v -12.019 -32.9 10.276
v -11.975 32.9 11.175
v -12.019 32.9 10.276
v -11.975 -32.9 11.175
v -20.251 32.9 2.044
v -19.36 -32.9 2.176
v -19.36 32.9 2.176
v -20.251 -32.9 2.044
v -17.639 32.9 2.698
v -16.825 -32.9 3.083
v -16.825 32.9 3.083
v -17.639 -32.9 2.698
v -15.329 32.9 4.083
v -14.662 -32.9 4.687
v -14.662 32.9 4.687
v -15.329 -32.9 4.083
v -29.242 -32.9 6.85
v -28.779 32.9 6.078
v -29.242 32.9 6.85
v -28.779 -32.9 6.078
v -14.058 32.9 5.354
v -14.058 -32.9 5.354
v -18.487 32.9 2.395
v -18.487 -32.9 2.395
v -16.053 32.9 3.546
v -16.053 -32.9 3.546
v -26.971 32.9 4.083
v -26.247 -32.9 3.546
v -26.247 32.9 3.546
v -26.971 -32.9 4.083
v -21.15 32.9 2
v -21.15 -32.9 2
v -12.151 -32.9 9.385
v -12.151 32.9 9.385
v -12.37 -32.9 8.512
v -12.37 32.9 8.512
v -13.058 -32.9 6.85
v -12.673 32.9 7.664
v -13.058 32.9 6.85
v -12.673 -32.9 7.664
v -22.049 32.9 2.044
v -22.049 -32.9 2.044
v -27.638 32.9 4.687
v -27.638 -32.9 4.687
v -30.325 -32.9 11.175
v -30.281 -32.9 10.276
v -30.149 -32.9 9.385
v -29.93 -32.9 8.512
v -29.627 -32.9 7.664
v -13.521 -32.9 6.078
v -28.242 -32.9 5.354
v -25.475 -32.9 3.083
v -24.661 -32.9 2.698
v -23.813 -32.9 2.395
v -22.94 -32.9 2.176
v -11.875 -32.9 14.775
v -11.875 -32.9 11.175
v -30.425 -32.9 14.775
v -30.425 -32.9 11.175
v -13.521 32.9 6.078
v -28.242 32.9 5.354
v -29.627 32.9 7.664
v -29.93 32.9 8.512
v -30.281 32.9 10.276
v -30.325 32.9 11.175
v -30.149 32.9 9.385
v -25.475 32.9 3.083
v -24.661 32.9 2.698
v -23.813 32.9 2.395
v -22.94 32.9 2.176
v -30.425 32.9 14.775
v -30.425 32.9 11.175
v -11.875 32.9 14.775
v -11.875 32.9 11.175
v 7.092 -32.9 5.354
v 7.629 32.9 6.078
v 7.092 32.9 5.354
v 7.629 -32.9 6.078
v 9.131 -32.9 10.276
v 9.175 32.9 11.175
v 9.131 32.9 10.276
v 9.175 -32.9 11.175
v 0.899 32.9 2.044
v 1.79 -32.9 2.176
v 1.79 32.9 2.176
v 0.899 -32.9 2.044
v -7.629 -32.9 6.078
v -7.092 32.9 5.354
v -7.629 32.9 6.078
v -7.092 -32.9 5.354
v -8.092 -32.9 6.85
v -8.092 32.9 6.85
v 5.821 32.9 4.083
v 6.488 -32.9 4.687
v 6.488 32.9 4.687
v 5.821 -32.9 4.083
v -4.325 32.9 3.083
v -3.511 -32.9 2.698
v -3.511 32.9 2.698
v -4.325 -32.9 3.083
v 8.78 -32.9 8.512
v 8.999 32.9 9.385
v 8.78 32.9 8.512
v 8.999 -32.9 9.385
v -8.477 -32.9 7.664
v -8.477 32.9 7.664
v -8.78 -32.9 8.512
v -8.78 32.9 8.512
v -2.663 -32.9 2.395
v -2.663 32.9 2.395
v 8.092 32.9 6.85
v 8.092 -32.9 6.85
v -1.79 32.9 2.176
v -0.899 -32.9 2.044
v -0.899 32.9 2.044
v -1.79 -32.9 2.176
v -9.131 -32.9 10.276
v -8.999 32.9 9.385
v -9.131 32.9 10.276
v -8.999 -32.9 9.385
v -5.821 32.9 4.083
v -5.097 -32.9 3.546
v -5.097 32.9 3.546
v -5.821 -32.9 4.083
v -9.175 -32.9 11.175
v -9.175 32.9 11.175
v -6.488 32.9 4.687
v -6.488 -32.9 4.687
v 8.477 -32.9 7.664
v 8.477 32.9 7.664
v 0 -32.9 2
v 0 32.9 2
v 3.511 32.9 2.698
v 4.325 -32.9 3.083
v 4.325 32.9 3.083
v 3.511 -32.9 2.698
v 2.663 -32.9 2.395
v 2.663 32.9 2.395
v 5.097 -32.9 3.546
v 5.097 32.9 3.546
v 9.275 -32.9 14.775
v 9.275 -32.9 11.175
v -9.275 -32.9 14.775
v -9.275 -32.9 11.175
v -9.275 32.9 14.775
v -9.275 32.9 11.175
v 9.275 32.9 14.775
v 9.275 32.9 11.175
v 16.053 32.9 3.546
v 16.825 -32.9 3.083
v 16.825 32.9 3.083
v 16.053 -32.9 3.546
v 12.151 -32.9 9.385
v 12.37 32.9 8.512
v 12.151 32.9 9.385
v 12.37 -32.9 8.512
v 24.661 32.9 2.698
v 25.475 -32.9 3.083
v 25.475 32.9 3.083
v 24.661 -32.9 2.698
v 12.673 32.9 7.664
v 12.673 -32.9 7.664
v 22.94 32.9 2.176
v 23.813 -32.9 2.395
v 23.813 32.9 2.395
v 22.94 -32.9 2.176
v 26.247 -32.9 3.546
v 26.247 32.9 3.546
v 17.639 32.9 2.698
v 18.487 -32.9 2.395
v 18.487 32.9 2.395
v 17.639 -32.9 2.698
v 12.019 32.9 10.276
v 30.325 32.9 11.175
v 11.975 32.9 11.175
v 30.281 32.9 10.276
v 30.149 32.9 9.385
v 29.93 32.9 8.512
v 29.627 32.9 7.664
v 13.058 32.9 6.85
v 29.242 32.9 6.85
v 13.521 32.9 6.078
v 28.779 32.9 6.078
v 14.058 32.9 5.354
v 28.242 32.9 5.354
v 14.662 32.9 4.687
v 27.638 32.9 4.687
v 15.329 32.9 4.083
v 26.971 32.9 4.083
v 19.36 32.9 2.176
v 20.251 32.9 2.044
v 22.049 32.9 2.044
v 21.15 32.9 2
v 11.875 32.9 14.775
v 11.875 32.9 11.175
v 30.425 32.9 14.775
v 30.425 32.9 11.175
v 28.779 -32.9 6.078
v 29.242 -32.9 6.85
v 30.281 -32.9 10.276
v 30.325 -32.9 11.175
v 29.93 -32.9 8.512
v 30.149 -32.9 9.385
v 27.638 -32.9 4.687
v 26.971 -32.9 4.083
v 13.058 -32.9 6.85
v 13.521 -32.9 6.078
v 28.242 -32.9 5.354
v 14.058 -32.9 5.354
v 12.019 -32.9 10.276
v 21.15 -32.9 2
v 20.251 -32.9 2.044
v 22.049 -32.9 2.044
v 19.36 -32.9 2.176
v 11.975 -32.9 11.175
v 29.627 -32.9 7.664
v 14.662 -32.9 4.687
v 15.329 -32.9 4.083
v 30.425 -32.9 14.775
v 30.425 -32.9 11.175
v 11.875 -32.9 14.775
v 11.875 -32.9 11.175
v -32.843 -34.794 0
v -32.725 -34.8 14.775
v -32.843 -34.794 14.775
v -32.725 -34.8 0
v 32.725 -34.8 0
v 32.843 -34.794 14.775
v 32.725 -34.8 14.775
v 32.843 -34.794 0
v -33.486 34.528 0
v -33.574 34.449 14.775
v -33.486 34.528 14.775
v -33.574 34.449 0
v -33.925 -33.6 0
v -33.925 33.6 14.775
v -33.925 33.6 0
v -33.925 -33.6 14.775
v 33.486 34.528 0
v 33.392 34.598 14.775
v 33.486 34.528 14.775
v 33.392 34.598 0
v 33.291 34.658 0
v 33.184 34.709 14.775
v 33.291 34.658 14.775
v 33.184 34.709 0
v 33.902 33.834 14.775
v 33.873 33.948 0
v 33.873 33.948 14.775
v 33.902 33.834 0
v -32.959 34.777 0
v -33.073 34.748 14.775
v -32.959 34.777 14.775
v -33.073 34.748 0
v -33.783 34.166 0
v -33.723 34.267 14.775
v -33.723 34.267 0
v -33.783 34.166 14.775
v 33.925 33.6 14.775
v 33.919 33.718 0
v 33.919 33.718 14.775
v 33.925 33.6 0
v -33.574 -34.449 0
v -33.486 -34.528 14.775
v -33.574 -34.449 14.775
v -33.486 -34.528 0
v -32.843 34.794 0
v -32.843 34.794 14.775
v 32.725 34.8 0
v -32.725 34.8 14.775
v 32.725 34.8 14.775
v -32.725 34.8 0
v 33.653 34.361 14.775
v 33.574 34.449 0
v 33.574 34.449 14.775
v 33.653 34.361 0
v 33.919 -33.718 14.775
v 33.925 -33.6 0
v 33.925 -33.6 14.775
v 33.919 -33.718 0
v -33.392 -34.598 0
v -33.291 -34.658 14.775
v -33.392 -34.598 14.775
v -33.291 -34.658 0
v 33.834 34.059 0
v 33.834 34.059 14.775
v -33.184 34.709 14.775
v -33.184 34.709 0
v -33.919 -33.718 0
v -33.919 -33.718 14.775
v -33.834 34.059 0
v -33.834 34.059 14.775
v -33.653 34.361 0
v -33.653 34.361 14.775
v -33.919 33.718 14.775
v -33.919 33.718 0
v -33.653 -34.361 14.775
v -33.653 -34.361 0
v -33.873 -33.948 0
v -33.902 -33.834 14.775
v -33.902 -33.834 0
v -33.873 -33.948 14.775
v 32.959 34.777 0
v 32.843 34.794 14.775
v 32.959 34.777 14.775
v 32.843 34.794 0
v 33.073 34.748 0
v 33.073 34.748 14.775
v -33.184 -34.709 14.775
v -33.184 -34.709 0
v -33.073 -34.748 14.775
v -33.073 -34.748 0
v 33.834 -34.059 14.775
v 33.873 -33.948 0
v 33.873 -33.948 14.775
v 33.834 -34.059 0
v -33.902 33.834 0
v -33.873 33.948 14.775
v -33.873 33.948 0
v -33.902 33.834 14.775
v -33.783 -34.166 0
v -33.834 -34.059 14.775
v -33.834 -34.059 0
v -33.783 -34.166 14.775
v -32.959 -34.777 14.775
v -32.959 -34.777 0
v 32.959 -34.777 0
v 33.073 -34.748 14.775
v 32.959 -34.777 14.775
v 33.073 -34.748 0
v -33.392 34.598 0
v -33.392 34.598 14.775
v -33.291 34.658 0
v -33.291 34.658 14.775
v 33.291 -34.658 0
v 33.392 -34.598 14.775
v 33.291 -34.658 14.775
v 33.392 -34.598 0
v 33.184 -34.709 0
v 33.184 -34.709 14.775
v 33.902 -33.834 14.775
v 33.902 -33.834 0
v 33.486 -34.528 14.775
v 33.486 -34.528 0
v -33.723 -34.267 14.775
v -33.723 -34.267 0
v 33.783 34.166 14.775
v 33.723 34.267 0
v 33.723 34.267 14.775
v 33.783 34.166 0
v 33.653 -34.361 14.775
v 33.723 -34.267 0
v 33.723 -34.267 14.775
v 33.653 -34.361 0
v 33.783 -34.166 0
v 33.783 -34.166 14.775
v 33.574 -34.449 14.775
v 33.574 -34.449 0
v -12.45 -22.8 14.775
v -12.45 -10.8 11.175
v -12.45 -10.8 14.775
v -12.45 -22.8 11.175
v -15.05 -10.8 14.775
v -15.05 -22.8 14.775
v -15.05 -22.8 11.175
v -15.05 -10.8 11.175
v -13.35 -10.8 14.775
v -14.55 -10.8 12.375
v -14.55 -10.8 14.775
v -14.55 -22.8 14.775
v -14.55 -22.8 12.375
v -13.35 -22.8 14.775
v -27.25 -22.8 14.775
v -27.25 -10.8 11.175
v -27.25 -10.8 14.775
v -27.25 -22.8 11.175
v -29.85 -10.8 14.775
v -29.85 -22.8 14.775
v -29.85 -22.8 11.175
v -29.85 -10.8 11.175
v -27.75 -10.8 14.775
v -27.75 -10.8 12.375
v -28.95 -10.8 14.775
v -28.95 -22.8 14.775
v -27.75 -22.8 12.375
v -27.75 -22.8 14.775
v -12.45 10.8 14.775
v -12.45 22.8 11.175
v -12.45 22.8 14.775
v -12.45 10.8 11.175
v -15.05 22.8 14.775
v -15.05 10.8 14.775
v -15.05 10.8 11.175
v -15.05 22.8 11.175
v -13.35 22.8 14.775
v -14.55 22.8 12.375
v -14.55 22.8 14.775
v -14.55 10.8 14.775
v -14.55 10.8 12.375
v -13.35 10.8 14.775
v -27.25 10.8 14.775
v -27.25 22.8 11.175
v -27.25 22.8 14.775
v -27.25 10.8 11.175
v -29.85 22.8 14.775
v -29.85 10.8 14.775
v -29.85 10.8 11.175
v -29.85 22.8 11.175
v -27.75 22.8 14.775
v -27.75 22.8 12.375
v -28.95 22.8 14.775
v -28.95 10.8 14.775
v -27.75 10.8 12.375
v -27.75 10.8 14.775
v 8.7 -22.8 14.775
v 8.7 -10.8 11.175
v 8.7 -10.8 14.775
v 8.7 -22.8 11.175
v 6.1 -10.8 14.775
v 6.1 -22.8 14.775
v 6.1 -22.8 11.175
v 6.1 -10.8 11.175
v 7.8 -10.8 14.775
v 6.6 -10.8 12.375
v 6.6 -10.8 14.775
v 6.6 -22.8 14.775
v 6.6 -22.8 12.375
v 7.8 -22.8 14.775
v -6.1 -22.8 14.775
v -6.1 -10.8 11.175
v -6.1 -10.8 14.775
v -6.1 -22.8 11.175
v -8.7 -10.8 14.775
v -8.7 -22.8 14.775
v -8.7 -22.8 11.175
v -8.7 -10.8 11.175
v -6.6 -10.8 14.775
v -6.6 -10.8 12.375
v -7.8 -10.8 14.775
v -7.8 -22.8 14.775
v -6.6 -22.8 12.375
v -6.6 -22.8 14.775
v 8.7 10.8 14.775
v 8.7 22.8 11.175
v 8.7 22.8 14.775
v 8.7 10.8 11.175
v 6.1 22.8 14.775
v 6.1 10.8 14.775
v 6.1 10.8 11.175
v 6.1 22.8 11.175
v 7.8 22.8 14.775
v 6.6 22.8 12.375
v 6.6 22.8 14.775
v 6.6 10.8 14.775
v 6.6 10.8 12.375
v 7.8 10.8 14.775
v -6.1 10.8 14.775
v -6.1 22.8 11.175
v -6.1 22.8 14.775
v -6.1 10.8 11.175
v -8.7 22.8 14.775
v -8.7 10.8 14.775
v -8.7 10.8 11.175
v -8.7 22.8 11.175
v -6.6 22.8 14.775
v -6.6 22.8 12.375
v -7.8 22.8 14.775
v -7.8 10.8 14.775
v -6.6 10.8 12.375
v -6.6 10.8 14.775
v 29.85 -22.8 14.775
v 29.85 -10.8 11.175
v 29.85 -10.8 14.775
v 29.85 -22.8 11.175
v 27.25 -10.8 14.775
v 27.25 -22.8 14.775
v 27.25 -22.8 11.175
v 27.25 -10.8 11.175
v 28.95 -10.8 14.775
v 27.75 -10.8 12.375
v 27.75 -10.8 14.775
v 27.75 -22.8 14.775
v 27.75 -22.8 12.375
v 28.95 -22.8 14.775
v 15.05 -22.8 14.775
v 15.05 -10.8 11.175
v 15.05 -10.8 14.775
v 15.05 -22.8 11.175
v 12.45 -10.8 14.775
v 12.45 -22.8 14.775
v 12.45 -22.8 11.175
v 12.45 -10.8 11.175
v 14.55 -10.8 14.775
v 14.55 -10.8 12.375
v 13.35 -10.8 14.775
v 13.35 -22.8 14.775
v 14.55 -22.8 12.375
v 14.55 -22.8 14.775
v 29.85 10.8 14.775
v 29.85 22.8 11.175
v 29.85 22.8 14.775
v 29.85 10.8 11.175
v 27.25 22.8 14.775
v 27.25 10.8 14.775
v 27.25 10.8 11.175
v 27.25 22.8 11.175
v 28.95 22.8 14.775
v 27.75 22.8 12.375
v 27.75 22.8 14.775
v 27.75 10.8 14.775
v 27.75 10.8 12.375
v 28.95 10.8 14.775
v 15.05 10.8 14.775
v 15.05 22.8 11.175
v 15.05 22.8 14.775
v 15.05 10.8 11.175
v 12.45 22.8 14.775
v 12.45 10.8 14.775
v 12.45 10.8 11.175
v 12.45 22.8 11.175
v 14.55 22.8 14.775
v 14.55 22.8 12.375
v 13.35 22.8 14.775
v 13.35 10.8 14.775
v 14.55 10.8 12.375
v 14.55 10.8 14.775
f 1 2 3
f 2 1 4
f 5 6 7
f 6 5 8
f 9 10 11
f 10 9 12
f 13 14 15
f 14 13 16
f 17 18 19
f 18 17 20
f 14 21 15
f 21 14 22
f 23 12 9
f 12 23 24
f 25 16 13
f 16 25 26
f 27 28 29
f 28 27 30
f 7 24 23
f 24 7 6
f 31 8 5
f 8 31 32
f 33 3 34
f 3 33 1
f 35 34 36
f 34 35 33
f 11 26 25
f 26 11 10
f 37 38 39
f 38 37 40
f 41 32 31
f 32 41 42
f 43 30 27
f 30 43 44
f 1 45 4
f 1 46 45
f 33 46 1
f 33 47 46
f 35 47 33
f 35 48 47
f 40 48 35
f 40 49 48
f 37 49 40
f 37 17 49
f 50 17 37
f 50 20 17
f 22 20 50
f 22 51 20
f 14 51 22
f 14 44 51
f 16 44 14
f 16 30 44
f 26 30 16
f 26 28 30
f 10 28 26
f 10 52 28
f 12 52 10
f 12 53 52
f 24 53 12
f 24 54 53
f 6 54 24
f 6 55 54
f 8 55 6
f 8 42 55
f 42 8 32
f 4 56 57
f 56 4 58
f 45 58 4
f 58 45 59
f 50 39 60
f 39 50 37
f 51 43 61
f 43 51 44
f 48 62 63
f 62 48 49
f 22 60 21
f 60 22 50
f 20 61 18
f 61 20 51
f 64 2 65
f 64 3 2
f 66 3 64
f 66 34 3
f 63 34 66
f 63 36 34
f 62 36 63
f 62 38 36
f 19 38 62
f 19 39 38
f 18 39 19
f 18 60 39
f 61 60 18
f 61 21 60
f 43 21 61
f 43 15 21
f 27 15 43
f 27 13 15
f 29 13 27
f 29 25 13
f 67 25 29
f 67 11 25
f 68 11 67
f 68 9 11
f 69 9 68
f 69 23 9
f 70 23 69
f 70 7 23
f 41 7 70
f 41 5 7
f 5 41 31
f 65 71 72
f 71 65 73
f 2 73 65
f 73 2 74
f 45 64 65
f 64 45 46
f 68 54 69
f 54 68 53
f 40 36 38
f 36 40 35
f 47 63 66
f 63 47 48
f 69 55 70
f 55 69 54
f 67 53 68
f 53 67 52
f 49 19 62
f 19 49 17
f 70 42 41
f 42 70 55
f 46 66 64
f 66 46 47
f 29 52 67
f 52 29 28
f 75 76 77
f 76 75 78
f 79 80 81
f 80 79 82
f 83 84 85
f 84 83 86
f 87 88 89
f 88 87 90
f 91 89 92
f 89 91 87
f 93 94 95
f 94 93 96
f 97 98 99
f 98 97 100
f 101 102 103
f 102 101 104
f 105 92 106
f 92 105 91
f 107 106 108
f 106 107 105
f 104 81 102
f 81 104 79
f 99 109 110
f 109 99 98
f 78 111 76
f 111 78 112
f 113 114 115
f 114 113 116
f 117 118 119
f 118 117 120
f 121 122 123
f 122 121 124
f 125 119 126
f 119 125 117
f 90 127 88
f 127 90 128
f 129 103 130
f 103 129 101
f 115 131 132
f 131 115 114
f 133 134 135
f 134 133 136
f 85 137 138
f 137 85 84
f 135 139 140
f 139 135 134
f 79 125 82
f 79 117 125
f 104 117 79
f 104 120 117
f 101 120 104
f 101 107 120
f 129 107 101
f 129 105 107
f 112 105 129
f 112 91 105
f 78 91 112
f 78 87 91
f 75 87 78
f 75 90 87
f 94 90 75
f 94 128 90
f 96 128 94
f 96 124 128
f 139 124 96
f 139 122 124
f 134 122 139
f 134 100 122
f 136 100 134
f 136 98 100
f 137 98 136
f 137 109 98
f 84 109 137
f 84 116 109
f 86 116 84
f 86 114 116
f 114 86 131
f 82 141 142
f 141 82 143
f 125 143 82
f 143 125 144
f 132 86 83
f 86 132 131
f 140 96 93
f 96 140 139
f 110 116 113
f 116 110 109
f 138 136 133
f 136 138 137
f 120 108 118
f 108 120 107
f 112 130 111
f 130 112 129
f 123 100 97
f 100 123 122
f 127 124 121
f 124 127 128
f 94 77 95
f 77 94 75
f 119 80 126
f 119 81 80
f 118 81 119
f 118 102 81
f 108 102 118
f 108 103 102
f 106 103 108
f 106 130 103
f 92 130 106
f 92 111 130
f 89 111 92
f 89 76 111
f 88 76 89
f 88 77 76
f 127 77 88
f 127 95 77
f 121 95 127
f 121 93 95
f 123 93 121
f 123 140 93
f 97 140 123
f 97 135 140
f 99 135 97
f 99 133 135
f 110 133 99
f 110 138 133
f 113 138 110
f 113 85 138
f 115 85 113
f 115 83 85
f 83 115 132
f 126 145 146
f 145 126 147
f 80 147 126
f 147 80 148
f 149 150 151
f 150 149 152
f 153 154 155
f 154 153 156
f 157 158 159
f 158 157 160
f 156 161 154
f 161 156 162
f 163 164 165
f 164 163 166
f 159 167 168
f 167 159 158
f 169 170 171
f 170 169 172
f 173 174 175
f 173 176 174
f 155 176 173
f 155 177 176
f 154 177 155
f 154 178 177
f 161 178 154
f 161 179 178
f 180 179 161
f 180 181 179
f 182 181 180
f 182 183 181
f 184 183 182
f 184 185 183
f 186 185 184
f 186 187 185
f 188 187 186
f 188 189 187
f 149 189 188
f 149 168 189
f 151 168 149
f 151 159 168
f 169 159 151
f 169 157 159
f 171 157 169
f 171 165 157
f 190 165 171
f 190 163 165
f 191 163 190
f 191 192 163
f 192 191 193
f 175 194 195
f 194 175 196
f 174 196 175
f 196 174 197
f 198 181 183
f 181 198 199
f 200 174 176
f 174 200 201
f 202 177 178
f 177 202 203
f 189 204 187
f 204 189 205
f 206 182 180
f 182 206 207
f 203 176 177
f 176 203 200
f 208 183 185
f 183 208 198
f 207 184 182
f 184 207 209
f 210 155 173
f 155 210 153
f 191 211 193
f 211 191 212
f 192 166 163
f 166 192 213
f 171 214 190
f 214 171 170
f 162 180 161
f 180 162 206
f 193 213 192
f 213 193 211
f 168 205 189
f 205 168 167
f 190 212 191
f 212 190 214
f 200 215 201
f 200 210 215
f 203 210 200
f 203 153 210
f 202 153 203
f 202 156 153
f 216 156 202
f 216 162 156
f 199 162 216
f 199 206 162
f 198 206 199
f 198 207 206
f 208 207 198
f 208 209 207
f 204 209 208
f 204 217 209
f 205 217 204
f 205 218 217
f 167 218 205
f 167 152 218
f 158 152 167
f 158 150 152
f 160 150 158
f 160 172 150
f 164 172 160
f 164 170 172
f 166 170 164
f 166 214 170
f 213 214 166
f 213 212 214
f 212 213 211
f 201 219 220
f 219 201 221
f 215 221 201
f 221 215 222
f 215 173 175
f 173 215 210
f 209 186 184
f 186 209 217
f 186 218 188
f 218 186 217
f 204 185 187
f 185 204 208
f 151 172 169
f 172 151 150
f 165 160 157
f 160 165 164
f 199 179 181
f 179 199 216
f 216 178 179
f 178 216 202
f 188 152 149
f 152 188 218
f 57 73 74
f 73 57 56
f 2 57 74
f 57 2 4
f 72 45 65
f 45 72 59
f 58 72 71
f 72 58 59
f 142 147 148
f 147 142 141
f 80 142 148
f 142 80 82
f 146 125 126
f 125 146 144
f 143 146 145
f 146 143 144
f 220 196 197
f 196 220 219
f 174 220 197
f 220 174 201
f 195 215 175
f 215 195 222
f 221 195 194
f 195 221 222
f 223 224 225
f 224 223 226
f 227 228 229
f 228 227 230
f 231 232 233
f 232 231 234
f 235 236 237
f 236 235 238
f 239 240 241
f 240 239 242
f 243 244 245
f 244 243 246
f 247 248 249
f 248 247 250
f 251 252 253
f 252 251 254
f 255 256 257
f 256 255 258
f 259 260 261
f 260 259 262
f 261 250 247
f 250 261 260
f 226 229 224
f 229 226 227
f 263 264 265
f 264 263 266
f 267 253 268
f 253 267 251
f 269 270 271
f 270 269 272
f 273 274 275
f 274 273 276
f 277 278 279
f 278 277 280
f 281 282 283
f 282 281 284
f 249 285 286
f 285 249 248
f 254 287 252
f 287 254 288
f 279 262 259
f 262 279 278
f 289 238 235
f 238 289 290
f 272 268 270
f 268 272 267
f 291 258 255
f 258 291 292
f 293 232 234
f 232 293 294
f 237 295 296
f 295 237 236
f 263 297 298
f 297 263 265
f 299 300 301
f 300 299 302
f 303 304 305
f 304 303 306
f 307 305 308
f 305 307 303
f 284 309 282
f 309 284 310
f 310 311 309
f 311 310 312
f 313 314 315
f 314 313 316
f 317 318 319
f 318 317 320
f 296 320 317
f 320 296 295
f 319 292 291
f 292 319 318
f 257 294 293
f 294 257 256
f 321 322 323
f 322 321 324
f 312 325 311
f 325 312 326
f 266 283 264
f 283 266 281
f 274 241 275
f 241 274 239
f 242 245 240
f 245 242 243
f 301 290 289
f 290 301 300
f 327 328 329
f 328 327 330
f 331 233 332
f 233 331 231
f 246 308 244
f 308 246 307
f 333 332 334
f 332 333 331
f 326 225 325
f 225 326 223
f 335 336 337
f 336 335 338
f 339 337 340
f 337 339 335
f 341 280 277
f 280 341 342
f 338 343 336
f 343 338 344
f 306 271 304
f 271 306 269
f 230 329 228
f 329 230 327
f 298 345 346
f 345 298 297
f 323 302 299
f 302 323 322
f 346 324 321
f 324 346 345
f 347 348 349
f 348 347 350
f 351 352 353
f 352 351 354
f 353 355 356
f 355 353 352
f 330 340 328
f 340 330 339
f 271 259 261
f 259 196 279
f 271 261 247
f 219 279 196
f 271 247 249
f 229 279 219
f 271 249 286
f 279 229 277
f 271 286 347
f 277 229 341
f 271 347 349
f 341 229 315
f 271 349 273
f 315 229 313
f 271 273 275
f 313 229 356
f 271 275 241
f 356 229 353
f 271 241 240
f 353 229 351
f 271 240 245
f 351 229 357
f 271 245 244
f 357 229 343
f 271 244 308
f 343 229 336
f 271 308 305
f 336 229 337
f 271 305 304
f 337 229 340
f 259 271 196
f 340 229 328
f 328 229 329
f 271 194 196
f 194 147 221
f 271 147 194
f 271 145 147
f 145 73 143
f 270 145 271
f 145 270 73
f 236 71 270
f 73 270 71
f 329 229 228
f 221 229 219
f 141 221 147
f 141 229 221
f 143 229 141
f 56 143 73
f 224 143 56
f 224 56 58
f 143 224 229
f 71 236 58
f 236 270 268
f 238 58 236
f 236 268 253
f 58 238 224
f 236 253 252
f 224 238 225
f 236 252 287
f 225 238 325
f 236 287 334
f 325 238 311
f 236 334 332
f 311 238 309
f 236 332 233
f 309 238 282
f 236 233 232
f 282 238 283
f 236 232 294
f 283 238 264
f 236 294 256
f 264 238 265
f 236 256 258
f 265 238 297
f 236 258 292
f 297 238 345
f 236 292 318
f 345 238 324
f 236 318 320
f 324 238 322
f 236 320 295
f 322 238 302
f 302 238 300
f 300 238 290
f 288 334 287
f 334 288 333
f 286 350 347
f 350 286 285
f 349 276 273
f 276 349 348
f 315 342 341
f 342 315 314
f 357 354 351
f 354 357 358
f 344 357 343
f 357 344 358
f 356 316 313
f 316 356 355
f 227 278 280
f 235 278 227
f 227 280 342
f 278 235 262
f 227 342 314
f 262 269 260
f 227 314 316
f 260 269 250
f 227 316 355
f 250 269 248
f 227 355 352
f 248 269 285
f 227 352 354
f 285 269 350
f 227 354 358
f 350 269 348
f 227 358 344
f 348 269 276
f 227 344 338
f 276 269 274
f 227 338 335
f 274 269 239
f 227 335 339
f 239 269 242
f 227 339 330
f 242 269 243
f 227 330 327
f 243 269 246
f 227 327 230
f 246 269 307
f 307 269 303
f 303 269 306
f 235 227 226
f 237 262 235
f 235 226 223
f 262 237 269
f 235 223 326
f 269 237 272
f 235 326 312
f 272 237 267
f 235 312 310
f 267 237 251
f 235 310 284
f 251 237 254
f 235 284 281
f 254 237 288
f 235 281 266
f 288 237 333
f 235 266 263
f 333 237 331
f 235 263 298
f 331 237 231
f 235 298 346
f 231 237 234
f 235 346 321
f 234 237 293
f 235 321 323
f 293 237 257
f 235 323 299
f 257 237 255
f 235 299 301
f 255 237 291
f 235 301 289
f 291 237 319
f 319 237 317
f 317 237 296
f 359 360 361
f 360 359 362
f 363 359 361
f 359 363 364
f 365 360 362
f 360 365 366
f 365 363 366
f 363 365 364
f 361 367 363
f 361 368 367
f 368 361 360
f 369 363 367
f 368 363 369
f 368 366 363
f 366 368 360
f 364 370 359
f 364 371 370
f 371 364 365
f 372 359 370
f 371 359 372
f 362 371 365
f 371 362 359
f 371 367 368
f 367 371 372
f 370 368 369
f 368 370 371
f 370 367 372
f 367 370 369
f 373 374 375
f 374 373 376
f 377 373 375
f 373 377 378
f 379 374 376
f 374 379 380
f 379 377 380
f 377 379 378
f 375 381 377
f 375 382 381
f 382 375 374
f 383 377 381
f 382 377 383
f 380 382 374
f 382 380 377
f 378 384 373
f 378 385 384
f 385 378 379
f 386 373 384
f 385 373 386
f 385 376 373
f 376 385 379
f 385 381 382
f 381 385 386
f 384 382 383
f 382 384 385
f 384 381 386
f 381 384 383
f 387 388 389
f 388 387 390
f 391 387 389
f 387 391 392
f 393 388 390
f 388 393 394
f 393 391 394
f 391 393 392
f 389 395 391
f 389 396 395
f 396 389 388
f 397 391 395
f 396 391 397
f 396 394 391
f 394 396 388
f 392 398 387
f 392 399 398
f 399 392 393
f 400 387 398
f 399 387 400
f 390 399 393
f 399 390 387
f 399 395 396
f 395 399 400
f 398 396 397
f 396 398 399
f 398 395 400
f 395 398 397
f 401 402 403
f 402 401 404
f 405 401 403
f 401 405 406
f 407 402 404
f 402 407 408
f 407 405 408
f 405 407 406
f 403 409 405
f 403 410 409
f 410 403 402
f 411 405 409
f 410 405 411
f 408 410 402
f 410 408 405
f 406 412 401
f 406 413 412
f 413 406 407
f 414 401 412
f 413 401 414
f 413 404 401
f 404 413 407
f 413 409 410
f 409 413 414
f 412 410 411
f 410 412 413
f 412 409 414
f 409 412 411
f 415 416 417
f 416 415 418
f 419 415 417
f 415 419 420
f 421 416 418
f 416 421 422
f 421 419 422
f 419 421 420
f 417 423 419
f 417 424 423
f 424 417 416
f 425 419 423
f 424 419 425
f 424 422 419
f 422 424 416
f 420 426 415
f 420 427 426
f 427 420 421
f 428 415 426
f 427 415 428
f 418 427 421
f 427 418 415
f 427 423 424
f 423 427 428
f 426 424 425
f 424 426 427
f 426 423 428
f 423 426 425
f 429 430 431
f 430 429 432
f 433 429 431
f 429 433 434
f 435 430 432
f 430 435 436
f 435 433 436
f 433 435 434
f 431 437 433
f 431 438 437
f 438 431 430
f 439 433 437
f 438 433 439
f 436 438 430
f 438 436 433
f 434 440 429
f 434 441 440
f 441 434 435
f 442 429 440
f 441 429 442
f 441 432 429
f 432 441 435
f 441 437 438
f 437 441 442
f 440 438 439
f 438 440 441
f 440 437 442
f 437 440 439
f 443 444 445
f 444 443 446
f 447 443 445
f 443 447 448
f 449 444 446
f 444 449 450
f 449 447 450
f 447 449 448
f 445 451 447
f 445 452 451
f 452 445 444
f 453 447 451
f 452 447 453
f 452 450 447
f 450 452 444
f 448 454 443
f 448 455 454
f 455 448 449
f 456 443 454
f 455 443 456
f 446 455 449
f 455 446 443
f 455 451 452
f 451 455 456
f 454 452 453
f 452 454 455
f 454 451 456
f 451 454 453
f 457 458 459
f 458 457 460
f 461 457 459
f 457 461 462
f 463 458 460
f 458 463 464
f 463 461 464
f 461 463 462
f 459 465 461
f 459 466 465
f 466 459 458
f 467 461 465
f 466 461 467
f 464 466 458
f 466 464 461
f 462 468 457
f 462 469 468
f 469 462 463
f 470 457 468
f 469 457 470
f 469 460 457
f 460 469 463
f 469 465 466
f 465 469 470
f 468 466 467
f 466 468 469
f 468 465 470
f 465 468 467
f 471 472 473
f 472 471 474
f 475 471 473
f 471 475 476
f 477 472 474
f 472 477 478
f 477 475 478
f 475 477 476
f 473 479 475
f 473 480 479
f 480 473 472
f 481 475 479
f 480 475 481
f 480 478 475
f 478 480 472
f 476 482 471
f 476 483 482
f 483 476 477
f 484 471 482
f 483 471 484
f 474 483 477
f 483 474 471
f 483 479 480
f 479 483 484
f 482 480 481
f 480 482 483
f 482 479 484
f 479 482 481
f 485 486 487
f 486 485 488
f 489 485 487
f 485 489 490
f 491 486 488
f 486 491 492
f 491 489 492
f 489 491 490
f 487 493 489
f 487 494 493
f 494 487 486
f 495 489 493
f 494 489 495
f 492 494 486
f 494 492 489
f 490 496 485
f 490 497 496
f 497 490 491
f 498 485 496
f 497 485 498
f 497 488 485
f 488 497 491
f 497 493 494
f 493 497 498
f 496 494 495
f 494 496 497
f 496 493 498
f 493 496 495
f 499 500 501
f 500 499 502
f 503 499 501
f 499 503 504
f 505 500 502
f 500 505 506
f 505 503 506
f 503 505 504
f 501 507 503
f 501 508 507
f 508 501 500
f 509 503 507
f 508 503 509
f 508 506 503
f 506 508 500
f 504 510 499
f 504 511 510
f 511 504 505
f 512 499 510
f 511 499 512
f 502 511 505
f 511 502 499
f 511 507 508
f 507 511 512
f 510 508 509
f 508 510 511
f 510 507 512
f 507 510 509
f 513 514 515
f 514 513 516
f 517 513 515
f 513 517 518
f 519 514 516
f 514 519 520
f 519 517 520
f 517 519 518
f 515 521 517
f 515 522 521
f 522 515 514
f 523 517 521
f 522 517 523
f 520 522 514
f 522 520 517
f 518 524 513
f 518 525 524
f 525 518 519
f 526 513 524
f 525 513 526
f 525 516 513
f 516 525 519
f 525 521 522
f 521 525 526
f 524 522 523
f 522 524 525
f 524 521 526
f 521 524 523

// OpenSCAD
// file: ../lib/fdm.scad
// Shared FDM-friendly helpers for OpensCAD parts.
// Include from parts with: include <../lib/fdm.scad>;

// Default mesh density when a caller does not pass fragments=.
default_fragments = 48;
// Tiny overshoot used only inside helper boolean cleanup (not a part dimension).
helper_epsilon    = 0.01;

// Rounded rectangle extruded along Z (2D fillet → manifold solid).
module rounded_rect(size, radius, center = true) {
    w = size[0];
    h = size[1];
    r = min(radius, min(w, h) / 2);
    offset(r = r)
        offset(delta = -r)
            square([w, h], center = center);
}

module rounded_box(size, radius, center = true) {
    linear_extrude(height = size[2], center = center)
        rounded_rect([size[0], size[1]], radius, center = true);
}

// Cylinder with optional countersink (flat-head screw seat).
module countersunk_hole(d, h, cs_d = undef, cs_h = undef, center = false, fragments = undef) {
    fn = is_undef(fragments) ? default_fragments : fragments;
    cd = is_undef(cs_d) ? d * 2 : cs_d;
    ch = is_undef(cs_h) ? (cd - d) / 2 : cs_h;
    union() {
        cylinder(d = d, h = h, center = center, $fn = fn);
        translate([0, 0, center ? h / 2 - ch : h - ch])
            cylinder(d1 = d, d2 = cd, h = ch, center = false, $fn = fn);
    }
}

// Simple through-hole.
module mounting_hole(d, h, center = false, fragments = undef) {
    fn = is_undef(fragments) ? default_fragments : fragments;
    cylinder(d = d, h = h, center = center, $fn = fn);
}

// Fillet along +Z edge of a cube corner (positive volume).
// Prefer 2D offset fillets on extruded profiles for reliable manifolds.
module cylinder_fillet(r, h, fragments = undef) {
    fn = is_undef(fragments) ? default_fragments : fragments;
    eps = helper_epsilon;
    difference() {
        translate([-eps, -eps, 0])
            cube([r + eps, r + eps, h]);
        translate([r, r, -eps])
            cylinder(r = r, h = h + 2 * eps, $fn = fn);
    }
}
// main file
// 3×18650 clamp-in cell holder — single-piece FDM tray with snap fingers.
//
// Customizer: Window → Customizer, tweak groups below, F5 to preview.
//
// How the clamp works:
//   Each cell sits in a lower cylindrical cradle. Short snap fingers protrude
//   past the equator at two stations along each cell. Push a cell in from
//   above; the fingers flex outward and snap back to retain it.
//
// Print orientation: flat on the tray base (cell axes along Y, openings +Z).
// Finger lead-ins are chamfered for support-free printing. Use a brim if needed.
//
// Mechanical holder only — not battery protection, wiring, or pack electronics.

include <../lib/fdm.scad>;

/* [Cell] */
cell_d           = 18.0;  // mm — nominal 18650 diameter
cell_l           = 65.0;  // mm — nominal 18650 length
cell_count       = 3;     // [1:1:6] number of cells side by side
radial_clearance = 0.35;  // mm — added to diameter for the pocket
length_clearance = 0.60;  // mm — total axial play inside the tray

/* [Layout] */
wall         = 2.0;  // mm — outer wall & min divider (~5× 0.4 mm nozzle)
floor_t      = 2.0;  // mm — tray floor thickness
pitch_extra  = 0.8;  // mm — extra center-to-center beyond pocket_d + wall
end_wall     = 2.0;  // mm — stop walls at each end of the cells
fillet       = 1.2;  // mm — outer tray corner radius (plan view)
side_pad     = 1.6;  // mm — extra solid beside outer cells (finger root strength)

/* [Clamp] */
clamp_gap          = 13.2;  // mm — clear gap between opposing finger tips
finger_height      = 3.6;   // mm — how far fingers rise above the equator
finger_thickness   = 1.6;   // mm — radial thickness of each flex finger
finger_length      = 12.0;  // mm — finger length along the cell axis
finger_inset       = 10.0;  // mm — finger setback from each end stop
lead_in_depth      = 1.2;   // mm — insertion chamfer depth on finger tip
lead_in_height     = 2.4;   // mm — insertion chamfer height on finger tip

/* [Print] */
nozzle       = 0.4;  // mm — informational (prefer walls as n× nozzle)
fragments    = 64;   // [24:8:128] circle resolution ($fn)
bool_epsilon = 0.2;  // mm — through-cut overshoot for clean differences

/* [Hidden] */
pocket_d     = cell_d + radial_clearance;
pocket_r     = pocket_d / 2;
pocket_l     = cell_l + length_clearance;
pitch        = pocket_d + wall + pitch_extra;
span_x       = (cell_count - 1) * pitch;
tray_outer_x = span_x + pocket_d + 2 * (wall + side_pad);
tray_outer_y = pocket_l + 2 * end_wall;
tray_outer_z = floor_t + pocket_r + finger_height;
equator_z    = floor_t + pocket_r;
finger_reach = (pocket_d - clamp_gap) / 2;  // how far each tip intrudes past mouth
$fn          = fragments;

function cell_center_x(i) = -span_x / 2 + i * pitch;

module cell_lower_pocket(i) {
    // Seat only at/below the equator
    intersection() {
        translate([cell_center_x(i), 0, equator_z])
            rotate([90, 0, 0])
                cylinder(d = pocket_d, h = pocket_l + bool_epsilon, center = true);
        translate([cell_center_x(i), 0, equator_z / 2])
            cube(
                [pocket_d + bool_epsilon, pocket_l + bool_epsilon, equator_z + bool_epsilon],
                center = true
            );
    }
}

module cell_top_opening(i) {
    // Open the top to the full pocket width; fingers are added back afterward
    translate([cell_center_x(i), 0, equator_z + finger_height / 2 + bool_epsilon / 2])
        cube(
            [pocket_d + bool_epsilon, pocket_l + bool_epsilon, finger_height + bool_epsilon],
            center = true
        );
}

module snap_finger(side) {
    // One flex finger; local origin at cell center on the floor plane
    // side: +1 = +X, -1 = −X
    tip_x = side * (clamp_gap / 2);
    // Finger body sits from tip outward by finger_thickness + a root into the wall
    root_extra = wall * 0.5;
    x_mid = tip_x + side * (finger_thickness / 2);
    difference() {
        translate([x_mid, 0, equator_z + finger_height / 2])
            cube(
                [finger_thickness + root_extra, finger_length, finger_height],
                center = true
            );
        // Insertion / print chamfer on the tip (faces the mouth)
        translate([tip_x, 0, equator_z + finger_height - lead_in_height])
            rotate([90, 0, 0])
                linear_extrude(height = finger_length + bool_epsilon, center = true)
                    polygon([
                        [0, lead_in_height],
                        [side * lead_in_depth, lead_in_height],
                        [0, 0]
                    ]);
    }
}

module fingers_for_cell(i) {
    cx = cell_center_x(i);
    for (y_sign = [-1, 1]) {
        y = y_sign * (pocket_l / 2 - finger_inset - finger_length / 2);
        translate([cx, y, 0]) {
            snap_finger(+1);
            snap_finger(-1);
        }
    }
}

module cell_holder_18650_x3() {
    assert(clamp_gap < pocket_d, "clamp_gap must be < pocket_d for retention");
    assert(finger_reach > 0, "fingers need positive inward reach");
    assert(cell_count >= 1, "cell_count must be >= 1");

    union() {
        difference() {
            translate([0, 0, tray_outer_z / 2])
                rounded_box(
                    [tray_outer_x, tray_outer_y, tray_outer_z],
                    fillet,
                    center = true
                );

            for (i = [0 : cell_count - 1]) {
                cell_lower_pocket(i);
                cell_top_opening(i);
            }
        }

        for (i = [0 : cell_count - 1])
            fingers_for_cell(i);
    }
}

cell_holder_18650_x3();
